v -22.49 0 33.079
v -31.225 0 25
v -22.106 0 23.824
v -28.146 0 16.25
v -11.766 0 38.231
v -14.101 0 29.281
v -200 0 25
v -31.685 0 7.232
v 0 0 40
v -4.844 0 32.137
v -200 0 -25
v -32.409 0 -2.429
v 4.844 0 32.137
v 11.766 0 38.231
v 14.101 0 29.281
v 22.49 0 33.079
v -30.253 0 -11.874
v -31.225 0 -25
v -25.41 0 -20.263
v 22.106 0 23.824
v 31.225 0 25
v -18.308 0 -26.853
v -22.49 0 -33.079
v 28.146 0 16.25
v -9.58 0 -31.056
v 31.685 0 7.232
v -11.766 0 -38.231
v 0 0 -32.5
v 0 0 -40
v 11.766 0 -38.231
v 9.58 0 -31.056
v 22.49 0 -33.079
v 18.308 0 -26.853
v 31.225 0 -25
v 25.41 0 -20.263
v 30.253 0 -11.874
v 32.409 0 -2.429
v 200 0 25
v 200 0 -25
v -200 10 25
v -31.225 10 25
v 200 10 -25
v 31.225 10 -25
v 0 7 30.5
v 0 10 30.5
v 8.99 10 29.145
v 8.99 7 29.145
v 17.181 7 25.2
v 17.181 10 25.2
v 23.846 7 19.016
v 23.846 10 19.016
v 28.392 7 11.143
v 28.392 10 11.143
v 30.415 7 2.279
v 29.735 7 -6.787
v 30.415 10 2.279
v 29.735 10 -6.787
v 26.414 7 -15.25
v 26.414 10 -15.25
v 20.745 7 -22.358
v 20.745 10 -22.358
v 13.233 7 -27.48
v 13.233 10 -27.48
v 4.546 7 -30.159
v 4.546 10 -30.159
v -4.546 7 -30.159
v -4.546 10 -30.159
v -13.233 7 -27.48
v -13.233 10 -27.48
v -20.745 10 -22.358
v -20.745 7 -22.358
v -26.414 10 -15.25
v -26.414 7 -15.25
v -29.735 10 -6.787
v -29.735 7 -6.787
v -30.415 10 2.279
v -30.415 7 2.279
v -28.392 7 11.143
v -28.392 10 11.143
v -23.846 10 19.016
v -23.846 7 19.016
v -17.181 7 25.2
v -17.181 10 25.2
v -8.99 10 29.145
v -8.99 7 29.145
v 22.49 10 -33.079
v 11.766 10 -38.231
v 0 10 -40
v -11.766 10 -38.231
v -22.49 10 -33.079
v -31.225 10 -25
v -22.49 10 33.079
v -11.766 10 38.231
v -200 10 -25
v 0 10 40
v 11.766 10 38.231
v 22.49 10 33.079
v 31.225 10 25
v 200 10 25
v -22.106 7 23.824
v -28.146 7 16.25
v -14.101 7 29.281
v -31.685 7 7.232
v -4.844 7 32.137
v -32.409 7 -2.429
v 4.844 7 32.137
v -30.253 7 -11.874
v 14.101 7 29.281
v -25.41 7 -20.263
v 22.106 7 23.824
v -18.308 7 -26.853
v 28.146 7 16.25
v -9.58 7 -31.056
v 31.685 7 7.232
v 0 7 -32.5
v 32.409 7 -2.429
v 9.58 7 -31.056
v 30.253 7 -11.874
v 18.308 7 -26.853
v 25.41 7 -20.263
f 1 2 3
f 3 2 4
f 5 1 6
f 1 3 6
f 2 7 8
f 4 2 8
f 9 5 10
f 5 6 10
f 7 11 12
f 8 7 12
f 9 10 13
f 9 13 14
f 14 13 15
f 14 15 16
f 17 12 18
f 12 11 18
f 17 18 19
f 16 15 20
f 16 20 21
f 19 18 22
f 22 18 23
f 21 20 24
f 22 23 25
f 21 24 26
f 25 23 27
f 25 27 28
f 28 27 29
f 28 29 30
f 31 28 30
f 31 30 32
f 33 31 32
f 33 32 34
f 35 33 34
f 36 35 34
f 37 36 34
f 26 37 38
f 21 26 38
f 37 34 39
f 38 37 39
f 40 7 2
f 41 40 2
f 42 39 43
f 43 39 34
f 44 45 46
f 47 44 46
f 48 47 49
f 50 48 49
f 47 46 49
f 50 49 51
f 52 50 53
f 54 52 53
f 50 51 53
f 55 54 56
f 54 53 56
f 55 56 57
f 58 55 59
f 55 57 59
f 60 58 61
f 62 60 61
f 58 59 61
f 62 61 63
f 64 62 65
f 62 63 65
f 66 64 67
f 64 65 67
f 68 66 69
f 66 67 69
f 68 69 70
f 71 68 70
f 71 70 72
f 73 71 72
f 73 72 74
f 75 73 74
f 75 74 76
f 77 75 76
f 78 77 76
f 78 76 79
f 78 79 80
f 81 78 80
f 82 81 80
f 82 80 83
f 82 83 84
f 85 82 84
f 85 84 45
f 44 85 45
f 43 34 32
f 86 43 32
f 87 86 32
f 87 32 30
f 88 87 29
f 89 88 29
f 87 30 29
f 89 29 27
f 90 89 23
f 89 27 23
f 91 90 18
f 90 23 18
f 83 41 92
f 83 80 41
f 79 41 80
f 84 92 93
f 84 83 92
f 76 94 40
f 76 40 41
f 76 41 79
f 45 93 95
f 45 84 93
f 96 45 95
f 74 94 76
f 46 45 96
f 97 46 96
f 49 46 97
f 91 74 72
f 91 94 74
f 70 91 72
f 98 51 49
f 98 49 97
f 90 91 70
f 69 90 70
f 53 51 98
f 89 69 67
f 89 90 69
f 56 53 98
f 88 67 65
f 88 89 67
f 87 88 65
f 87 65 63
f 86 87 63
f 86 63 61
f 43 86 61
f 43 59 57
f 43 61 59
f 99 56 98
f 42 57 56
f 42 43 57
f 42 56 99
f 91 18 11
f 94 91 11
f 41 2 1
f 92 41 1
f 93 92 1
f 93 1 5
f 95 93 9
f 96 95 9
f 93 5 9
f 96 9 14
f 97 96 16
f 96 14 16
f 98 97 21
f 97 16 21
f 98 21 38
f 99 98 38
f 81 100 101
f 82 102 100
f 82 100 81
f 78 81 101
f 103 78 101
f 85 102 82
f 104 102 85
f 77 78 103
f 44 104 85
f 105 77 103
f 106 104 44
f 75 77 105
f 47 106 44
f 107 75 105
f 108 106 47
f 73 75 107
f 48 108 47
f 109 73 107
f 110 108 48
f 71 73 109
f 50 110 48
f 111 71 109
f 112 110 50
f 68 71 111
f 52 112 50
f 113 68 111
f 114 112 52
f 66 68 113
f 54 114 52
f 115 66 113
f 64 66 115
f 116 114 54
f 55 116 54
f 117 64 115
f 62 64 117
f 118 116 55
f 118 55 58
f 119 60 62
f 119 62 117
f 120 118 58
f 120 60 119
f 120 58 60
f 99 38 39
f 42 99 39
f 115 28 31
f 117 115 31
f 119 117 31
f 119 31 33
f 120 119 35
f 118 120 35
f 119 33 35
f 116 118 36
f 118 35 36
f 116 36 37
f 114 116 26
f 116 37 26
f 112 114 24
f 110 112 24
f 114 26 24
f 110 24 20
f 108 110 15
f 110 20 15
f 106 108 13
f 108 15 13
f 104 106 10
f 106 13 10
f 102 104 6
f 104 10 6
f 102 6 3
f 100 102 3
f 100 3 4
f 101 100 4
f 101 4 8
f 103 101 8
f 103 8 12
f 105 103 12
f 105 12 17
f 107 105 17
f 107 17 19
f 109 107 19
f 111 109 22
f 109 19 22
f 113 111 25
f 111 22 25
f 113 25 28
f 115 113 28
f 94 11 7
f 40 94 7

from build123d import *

# Parameters (mm, degrees)
BOSS_EXTRUDE1_DEPTH = 10
CUT_EXTRUDE3_REACH  = 206.206
SKETCH4_R           = 30.5
SKETCH3_R           = 32.5
CUT_EXTRUDE4_DEPTH  = 7


with BuildPart() as part:
    # Sketch1 → Boss-Extrude1 (new body)
    with BuildSketch(Plane(origin=(0, 0, 0), x_dir=(1, 0, 0), z_dir=(0, 1, 0))):
        with BuildLine():
            ThreePointArc((31.224989992, 25), (0, 40), (-31.224989992, 25))
            Line((-31.224989992, 25), (31.224989992, 25))
        make_face()
        with BuildLine():
            Line((31.224989992, 25), (-31.224989992, 25))
            ThreePointArc((-31.224989992, 25), (-40, 0), (-31.224989992, -25))
            Line((-31.224989992, -25), (31.224989992, -25))
            ThreePointArc((31.224989992, -25), (37.742546282, -13.247648854), (40, 0))
            ThreePointArc((40, 0), (37.742546282, 13.247648854), (31.224989992, 25))
        make_face()
        with BuildLine():
            Line((-31.224989992, 25), (-200, 25))
            Line((-200, 25), (-200, -25))
            Line((-200, -25), (-31.224989992, -25))
            ThreePointArc((-31.224989992, -25), (-40, 0), (-31.224989992, 25))
        make_face()
        with BuildLine():
            Line((200, 25), (31.224989992, 25))
            ThreePointArc((31.224989992, 25), (37.742546282, 13.247648854), (40, 0))
            ThreePointArc((40, 0), (37.742546282, -13.247648854), (31.224989992, -25))
            Line((31.224989992, -25), (200, -25))
            Line((200, -25), (200, 25))
        make_face()
        with BuildLine():
            Line((31.224989992, -25), (-31.224989992, -25))
            ThreePointArc((-31.224989992, -25), (0, -40), (31.224989992, -25))
        make_face()
    extrude(amount=BOSS_EXTRUDE1_DEPTH)

    # Sketch4 → Cut-Extrude3 (cut, up to next)
    with BuildSketch(Plane(origin=(0, 10, 0), x_dir=(1, 0, 0), z_dir=(0, 1, 0)), mode=Mode.PRIVATE) as cut_extrude3_sk1:
        with Locations(Location((0, 0, 0), (0, 0, 270))):
            Circle(SKETCH4_R)
    cut_extrude3_tool1 = extrude(cut_extrude3_sk1.sketch, amount=-CUT_EXTRUDE3_REACH, mode=Mode.PRIVATE) & part.part
    add(cut_extrude3_tool1.solids().sort_by_distance((0, 10, 0))[0], mode=Mode.SUBTRACT)

    # Sketch3 → Cut-Extrude4 (cut)
    with BuildSketch(Plane.XZ):
        with Locations(Location((0, 0, 0), (0, 0, 270))):
            Circle(SKETCH3_R)
    extrude(amount=-CUT_EXTRUDE4_DEPTH, mode=Mode.SUBTRACT)


solid = part.part
